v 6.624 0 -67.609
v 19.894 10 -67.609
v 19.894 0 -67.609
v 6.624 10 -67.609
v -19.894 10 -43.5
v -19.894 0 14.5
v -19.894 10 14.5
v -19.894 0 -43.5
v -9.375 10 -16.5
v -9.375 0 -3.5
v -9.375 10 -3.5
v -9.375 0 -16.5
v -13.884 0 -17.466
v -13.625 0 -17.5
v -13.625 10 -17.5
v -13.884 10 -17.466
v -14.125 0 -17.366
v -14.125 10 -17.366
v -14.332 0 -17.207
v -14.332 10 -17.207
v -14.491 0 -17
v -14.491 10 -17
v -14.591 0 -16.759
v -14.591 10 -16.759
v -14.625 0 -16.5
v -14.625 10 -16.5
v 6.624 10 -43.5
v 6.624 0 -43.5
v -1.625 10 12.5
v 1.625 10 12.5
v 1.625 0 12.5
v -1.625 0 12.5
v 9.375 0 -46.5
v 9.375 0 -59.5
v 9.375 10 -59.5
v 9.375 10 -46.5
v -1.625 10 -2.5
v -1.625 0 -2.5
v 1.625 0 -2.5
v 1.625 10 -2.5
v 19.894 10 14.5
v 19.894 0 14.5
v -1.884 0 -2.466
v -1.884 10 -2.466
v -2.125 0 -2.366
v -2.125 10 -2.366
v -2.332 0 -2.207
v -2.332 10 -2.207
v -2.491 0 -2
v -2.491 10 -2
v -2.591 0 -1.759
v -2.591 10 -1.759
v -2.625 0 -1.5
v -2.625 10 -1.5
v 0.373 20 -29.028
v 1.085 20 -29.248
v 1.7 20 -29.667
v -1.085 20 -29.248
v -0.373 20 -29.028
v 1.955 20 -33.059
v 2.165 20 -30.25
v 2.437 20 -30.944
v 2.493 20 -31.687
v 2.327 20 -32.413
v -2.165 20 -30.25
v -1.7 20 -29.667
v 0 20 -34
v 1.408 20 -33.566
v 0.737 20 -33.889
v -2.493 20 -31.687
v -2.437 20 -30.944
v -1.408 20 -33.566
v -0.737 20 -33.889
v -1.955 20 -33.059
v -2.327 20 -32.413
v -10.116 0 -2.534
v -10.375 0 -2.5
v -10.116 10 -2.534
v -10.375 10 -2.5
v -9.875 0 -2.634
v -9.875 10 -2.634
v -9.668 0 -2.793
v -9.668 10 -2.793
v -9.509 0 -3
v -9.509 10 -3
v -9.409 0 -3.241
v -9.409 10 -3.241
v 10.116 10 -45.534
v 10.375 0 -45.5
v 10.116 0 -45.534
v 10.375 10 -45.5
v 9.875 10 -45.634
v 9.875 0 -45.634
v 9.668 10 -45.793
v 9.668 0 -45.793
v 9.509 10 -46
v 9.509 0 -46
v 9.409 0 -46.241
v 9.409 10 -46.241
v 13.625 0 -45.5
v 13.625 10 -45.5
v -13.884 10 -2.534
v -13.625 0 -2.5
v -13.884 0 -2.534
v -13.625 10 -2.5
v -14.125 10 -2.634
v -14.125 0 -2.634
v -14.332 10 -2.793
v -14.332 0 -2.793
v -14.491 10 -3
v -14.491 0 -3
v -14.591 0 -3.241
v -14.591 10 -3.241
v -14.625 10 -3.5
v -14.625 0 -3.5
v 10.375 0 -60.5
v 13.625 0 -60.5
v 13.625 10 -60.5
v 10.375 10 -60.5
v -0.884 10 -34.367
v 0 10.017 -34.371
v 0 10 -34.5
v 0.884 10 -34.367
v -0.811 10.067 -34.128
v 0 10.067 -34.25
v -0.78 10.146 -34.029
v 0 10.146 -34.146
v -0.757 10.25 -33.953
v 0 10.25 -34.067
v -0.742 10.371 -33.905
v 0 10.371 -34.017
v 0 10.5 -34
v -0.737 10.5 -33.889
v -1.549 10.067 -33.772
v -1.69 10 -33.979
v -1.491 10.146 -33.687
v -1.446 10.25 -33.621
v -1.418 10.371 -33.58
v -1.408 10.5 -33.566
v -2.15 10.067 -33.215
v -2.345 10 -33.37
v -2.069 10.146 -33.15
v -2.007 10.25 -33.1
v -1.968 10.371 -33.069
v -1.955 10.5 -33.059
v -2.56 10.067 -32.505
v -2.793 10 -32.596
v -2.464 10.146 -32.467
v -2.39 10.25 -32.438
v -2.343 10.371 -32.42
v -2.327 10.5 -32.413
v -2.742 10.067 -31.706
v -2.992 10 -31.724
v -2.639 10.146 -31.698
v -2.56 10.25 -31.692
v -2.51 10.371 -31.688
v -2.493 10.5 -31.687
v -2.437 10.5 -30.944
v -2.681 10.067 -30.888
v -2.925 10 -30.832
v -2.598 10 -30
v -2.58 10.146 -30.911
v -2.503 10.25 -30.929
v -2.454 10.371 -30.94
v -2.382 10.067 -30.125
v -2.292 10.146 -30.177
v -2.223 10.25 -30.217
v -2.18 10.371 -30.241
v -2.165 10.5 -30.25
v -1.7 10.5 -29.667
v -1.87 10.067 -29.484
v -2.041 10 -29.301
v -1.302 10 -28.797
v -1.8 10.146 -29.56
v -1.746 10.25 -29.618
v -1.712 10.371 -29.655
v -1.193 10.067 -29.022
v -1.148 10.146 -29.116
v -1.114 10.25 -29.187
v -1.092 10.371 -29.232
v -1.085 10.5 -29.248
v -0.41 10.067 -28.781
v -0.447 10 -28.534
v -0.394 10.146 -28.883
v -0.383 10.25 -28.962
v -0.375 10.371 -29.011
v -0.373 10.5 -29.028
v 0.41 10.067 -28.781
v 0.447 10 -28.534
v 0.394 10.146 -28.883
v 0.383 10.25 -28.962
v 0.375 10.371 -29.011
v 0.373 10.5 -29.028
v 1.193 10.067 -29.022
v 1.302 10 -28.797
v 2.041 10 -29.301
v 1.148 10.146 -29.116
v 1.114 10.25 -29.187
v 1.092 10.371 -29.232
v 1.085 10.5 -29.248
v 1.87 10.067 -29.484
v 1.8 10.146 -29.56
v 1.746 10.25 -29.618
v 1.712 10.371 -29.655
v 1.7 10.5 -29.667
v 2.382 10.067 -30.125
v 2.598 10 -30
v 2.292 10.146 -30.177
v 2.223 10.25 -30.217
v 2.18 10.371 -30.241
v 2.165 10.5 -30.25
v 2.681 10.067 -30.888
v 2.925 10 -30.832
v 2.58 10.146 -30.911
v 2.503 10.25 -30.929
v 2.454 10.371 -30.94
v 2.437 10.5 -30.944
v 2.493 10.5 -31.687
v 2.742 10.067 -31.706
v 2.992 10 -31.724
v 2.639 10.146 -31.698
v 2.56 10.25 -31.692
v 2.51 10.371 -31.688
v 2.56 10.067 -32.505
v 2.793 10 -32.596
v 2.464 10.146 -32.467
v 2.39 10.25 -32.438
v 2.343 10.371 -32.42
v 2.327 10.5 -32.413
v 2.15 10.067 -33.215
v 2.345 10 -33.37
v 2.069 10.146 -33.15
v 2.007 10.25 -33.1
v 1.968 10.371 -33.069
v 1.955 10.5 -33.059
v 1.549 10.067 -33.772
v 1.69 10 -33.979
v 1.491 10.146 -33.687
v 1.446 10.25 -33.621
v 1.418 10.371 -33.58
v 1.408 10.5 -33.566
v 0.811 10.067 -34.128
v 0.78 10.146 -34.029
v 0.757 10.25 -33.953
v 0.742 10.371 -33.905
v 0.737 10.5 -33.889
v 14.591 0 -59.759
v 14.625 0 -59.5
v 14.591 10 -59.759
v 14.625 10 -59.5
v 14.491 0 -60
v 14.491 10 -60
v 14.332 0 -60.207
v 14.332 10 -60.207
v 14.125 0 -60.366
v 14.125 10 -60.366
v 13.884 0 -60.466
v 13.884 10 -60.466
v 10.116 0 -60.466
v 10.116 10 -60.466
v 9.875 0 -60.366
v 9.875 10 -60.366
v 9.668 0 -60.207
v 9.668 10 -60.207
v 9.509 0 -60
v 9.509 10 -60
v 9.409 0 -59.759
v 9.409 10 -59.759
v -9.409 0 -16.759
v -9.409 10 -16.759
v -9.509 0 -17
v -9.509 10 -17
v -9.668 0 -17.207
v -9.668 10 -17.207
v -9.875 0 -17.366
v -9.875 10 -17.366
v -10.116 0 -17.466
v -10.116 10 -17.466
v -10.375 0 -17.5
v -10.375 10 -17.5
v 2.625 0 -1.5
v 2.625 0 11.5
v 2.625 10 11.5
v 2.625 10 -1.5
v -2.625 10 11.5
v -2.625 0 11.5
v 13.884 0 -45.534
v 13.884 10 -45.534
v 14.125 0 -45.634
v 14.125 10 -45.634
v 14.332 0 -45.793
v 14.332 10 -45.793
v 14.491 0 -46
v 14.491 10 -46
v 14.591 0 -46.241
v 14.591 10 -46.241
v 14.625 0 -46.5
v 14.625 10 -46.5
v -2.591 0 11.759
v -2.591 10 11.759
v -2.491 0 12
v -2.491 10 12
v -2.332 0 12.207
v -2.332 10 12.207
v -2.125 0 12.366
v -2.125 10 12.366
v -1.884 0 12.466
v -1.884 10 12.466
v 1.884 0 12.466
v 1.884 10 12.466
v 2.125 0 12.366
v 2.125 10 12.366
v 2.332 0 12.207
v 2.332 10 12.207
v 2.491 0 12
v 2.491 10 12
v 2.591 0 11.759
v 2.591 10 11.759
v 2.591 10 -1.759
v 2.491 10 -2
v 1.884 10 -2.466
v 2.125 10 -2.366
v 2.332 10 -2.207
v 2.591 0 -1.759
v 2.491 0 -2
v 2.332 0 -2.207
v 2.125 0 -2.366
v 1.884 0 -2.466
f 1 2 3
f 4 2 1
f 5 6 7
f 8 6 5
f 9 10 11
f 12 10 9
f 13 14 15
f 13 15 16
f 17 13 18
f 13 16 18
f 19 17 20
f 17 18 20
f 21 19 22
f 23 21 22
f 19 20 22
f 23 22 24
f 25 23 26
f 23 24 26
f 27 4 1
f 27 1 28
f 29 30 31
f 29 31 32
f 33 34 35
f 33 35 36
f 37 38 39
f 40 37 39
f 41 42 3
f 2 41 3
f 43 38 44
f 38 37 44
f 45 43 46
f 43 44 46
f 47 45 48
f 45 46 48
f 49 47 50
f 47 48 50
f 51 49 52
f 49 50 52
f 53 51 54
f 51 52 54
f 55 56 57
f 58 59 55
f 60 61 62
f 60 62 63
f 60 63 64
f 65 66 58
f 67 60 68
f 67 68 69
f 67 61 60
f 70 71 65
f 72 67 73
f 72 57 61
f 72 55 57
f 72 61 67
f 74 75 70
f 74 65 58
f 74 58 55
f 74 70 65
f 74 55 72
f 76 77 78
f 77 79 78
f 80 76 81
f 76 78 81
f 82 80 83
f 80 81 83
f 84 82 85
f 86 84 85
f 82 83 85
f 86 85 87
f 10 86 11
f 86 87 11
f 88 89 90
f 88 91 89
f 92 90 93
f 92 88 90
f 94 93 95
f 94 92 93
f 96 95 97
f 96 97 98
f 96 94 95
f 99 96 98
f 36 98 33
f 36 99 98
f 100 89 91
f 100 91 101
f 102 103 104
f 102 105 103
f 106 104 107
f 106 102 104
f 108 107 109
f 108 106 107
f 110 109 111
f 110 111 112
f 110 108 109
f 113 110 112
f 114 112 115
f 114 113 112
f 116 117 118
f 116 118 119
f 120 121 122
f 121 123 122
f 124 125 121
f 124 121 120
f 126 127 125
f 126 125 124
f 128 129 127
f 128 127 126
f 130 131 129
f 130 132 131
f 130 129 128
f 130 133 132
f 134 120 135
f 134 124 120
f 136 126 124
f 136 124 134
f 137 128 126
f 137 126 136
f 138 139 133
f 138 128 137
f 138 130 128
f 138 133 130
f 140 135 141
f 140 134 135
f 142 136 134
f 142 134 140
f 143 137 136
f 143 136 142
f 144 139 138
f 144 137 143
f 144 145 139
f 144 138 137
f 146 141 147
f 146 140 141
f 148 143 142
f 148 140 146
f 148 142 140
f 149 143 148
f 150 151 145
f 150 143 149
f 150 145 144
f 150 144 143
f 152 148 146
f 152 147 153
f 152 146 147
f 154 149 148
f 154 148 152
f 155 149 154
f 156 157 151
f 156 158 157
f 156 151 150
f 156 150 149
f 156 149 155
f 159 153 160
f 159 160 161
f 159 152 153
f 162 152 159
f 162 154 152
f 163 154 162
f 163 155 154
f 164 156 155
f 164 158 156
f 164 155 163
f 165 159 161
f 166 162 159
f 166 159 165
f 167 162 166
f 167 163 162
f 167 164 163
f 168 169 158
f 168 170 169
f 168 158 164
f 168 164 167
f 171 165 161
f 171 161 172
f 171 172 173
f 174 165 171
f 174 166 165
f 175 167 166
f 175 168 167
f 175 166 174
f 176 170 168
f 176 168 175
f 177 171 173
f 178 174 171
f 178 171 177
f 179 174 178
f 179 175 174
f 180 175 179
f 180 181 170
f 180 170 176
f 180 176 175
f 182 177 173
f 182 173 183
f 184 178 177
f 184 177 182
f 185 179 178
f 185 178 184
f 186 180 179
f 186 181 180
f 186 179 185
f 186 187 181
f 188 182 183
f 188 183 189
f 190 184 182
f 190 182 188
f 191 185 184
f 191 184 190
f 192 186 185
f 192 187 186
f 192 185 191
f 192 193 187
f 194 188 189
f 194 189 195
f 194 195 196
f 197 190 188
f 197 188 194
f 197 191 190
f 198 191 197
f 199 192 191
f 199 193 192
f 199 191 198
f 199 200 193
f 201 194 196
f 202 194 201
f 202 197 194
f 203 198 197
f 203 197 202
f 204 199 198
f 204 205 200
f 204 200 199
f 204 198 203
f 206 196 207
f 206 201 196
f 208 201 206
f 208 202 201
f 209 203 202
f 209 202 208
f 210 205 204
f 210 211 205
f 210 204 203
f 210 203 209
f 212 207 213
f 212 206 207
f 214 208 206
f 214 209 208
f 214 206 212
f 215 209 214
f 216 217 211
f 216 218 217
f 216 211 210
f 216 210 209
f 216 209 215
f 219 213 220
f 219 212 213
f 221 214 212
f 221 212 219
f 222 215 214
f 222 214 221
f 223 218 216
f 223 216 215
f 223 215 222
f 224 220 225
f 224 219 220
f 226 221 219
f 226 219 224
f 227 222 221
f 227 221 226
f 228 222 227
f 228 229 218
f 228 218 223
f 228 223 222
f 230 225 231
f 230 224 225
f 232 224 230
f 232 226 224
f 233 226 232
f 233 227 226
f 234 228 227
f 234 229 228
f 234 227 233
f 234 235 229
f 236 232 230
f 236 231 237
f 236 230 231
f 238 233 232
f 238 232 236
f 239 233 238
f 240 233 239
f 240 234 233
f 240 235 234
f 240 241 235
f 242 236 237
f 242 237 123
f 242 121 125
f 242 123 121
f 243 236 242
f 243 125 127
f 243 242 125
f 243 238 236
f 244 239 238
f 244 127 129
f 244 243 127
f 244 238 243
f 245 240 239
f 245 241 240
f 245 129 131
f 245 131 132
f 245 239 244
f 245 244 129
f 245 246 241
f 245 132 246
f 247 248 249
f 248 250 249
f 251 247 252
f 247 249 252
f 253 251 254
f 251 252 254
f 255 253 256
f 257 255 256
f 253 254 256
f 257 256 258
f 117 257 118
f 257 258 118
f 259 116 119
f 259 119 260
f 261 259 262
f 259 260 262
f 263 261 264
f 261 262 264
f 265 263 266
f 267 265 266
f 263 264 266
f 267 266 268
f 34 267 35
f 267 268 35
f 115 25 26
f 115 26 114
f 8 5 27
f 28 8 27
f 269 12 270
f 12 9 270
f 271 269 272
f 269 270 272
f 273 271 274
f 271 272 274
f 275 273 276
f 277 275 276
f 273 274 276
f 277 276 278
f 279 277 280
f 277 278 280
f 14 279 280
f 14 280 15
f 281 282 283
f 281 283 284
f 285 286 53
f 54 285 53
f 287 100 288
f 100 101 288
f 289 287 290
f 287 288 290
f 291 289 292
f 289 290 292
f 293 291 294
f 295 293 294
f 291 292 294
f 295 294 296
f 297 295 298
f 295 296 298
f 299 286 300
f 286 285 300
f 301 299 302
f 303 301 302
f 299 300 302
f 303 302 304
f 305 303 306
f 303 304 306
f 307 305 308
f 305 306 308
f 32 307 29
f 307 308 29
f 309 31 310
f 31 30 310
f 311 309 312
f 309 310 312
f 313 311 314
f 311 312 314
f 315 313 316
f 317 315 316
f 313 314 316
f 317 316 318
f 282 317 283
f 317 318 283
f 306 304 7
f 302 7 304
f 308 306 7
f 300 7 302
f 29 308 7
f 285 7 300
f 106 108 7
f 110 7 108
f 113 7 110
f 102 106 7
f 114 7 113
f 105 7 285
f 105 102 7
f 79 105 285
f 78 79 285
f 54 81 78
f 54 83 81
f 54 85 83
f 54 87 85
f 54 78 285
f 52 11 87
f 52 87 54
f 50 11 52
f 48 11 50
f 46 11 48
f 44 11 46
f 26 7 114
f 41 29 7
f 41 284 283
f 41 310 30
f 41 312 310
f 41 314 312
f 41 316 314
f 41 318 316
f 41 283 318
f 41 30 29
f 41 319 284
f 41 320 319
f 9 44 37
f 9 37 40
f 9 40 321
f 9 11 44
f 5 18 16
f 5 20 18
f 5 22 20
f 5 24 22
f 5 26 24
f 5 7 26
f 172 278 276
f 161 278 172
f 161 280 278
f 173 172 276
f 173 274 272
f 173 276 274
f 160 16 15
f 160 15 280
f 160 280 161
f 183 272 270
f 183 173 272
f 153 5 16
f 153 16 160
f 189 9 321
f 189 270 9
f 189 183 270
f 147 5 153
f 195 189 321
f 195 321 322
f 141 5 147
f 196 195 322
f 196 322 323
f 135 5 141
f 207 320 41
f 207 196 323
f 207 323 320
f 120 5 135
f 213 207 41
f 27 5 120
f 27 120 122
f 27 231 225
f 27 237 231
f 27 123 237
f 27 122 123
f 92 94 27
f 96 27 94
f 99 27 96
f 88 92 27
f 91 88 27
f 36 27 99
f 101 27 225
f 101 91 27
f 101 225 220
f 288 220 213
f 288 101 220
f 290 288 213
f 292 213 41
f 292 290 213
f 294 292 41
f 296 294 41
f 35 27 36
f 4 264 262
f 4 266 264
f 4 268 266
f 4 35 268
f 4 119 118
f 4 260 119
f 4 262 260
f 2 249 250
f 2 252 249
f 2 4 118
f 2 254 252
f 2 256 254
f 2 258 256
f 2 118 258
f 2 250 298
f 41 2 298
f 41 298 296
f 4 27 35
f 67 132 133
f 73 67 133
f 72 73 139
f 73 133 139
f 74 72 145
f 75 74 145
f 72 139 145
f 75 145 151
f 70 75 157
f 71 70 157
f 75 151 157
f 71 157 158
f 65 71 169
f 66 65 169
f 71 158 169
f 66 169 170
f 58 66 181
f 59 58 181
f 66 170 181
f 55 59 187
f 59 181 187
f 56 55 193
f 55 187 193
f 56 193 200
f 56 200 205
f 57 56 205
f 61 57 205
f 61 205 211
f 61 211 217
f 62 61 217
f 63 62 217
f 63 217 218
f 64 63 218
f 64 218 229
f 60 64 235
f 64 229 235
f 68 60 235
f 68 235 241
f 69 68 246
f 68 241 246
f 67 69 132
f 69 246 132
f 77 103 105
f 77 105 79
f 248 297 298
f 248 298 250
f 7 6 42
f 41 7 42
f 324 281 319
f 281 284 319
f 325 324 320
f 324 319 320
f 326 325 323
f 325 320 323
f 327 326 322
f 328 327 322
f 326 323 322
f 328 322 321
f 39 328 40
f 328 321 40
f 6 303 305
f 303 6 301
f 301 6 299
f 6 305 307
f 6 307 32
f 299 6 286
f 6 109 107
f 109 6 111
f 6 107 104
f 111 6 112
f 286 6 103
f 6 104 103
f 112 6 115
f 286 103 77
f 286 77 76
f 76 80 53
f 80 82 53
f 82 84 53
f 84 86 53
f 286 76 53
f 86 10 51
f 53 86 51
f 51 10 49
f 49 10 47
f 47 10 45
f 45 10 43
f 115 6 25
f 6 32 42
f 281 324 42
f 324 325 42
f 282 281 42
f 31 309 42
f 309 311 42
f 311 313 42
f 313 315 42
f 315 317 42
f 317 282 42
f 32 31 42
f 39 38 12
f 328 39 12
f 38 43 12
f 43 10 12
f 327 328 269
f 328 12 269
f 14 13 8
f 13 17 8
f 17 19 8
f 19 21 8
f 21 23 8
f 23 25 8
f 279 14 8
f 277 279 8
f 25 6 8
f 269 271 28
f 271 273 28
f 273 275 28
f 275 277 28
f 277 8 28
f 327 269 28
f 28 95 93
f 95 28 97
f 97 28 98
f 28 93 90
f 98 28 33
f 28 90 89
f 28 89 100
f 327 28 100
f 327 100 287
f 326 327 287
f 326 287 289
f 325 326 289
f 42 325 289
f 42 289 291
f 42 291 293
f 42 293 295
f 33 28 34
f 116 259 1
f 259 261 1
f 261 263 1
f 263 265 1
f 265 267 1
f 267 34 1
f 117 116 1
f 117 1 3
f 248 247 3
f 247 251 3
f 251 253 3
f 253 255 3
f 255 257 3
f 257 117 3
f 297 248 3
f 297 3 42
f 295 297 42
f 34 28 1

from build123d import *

# Parameters (mm, degrees)
BOSS_EXTRUDE1_DEPTH  = 10
FILLET2_R            = 1
FILLET2_OF_MIRROR1_R = 1
CUT_EXTRUDE1_DEPTH   = 81.635062113
FILLET3_R            = 1
SKETCH5_R            = 2.5
BOSS_EXTRUDE2_DEPTH  = 10
FILLET1_R            = 0.5
CUT_EXTRUDE2_DEPTH   = 10


with BuildPart() as part:
    # Sketch2 → Boss-Extrude1 (new body)
    with BuildSketch(Plane(origin=(0, 0, 0), x_dir=(1, 0, 0), z_dir=(0, 1, 0))):
        Polygon((-19.893799085, 77.5), (0, 77.5), (0, 75.5), (-2.625, 75.5), (-2.625, 73), (-2.625, 63), (-2.625, 60.5), (0, 60.5), (0, 60.375), (0, 2.5), (-2.625, 2.5), (-2.625, 0), (-2.625, -10), (-2.625, -12.5), (0, -12.5), (0, -14.5), (-19.893799085, -14.5), align=None)
    boss_extrude1 = extrude(amount=BOSS_EXTRUDE1_DEPTH)

    # Fillet2
    fillet2_edges = [part.edges().sort_by_distance(p)[0] for p in [
        (-2.625, 5, 12.5),
        (-2.625, 5, -2.5),
        (-2.625, 5, -60.5),
        (-2.625, 5, -75.5),
    ]]
    fillet(fillet2_edges, radius=FILLET2_R)

    # Mirror1: Boss-Extrude1 across Right Plane
    add(boss_extrude1.mirror(Plane(origin=(0, 0, 0), x_dir=(0, 0, -1), z_dir=(1, 0, 0))))

    # Fillet2 of Mirror1
    fillet2_of_mirror1_edges = [part.edges().sort_by_distance(p)[0] for p in [
        (2.625, 5, 12.5),
        (2.625, 5, -2.5),
        (2.625, 5, -60.5),
        (2.625, 5, -75.5),
    ]]
    fillet(fillet2_of_mirror1_edges, radius=FILLET2_OF_MIRROR1_R)

    # Sketch4 → Cut-Extrude1 (cut, through all)
    with BuildSketch(Plane(origin=(0, 0, 0), x_dir=(1, 0, 0), z_dir=(0, 1, 0))):
        Polygon((-14.625, 15), (-14.625, 5), (-14.625, 2.5), (-12, 2.5), (-9.375, 2.5), (-9.375, 5), (-9.375, 15), (-9.375, 17.5), (-12, 17.5), (-14.625, 17.5), align=None)
        Polygon((9.375, 58), (9.375, 48), (9.375, 45.5), (12, 45.5), (14.625, 45.5), (14.625, 48), (14.625, 58), (14.625, 60.5), (12, 60.5), (9.375, 60.5), align=None)
    extrude(amount=CUT_EXTRUDE1_DEPTH, mode=Mode.SUBTRACT)

    # Fillet3
    fillet3_edges = [part.edges().sort_by_distance(p)[0] for p in [
        (-14.625, 5, -17.5),
        (-14.625, 5, -2.5),
        (-9.375, 5, -2.5),
        (-9.375, 5, -17.5),
        (14.625, 5, -60.5),
        (9.375, 5, -60.5),
        (9.375, 5, -45.5),
        (14.625, 5, -45.5),
    ]]
    fillet(fillet3_edges, radius=FILLET3_R)

    # Sketch5 → Boss-Extrude2 (add)
    with BuildSketch(Plane(origin=(0, 10, 0), x_dir=(1, 0, 0), z_dir=(0, 1, 0))):
        with Locations(Location((0, 31.5, 0), (0, 0, 90))):
            Circle(SKETCH5_R)
    extrude(amount=BOSS_EXTRUDE2_DEPTH)

    # Fillet1
    fillet1_edges = [part.edges().sort_by_distance(p)[0] for p in [
        (0, 10, -29),
    ]]
    fillet(fillet1_edges, radius=FILLET1_R)

    # Sketch6 → Cut-Extrude2 (cut)
    with BuildSketch(Plane(origin=(0, 10, 0), x_dir=(1, 0, 0), z_dir=(0, 1, 0))):
        Polygon((19.893799085, 77.5), (19.893799085, 67.609192382), (6.623799085, 67.609192382), (6.623799085, 43.5), (-6.625, 43.5), (-19.893799085, 43.5), (-19.893799085, 77.5), (-6.625, 77.5), align=None)
    extrude(amount=-CUT_EXTRUDE2_DEPTH, mode=Mode.SUBTRACT)


solid = part.part
